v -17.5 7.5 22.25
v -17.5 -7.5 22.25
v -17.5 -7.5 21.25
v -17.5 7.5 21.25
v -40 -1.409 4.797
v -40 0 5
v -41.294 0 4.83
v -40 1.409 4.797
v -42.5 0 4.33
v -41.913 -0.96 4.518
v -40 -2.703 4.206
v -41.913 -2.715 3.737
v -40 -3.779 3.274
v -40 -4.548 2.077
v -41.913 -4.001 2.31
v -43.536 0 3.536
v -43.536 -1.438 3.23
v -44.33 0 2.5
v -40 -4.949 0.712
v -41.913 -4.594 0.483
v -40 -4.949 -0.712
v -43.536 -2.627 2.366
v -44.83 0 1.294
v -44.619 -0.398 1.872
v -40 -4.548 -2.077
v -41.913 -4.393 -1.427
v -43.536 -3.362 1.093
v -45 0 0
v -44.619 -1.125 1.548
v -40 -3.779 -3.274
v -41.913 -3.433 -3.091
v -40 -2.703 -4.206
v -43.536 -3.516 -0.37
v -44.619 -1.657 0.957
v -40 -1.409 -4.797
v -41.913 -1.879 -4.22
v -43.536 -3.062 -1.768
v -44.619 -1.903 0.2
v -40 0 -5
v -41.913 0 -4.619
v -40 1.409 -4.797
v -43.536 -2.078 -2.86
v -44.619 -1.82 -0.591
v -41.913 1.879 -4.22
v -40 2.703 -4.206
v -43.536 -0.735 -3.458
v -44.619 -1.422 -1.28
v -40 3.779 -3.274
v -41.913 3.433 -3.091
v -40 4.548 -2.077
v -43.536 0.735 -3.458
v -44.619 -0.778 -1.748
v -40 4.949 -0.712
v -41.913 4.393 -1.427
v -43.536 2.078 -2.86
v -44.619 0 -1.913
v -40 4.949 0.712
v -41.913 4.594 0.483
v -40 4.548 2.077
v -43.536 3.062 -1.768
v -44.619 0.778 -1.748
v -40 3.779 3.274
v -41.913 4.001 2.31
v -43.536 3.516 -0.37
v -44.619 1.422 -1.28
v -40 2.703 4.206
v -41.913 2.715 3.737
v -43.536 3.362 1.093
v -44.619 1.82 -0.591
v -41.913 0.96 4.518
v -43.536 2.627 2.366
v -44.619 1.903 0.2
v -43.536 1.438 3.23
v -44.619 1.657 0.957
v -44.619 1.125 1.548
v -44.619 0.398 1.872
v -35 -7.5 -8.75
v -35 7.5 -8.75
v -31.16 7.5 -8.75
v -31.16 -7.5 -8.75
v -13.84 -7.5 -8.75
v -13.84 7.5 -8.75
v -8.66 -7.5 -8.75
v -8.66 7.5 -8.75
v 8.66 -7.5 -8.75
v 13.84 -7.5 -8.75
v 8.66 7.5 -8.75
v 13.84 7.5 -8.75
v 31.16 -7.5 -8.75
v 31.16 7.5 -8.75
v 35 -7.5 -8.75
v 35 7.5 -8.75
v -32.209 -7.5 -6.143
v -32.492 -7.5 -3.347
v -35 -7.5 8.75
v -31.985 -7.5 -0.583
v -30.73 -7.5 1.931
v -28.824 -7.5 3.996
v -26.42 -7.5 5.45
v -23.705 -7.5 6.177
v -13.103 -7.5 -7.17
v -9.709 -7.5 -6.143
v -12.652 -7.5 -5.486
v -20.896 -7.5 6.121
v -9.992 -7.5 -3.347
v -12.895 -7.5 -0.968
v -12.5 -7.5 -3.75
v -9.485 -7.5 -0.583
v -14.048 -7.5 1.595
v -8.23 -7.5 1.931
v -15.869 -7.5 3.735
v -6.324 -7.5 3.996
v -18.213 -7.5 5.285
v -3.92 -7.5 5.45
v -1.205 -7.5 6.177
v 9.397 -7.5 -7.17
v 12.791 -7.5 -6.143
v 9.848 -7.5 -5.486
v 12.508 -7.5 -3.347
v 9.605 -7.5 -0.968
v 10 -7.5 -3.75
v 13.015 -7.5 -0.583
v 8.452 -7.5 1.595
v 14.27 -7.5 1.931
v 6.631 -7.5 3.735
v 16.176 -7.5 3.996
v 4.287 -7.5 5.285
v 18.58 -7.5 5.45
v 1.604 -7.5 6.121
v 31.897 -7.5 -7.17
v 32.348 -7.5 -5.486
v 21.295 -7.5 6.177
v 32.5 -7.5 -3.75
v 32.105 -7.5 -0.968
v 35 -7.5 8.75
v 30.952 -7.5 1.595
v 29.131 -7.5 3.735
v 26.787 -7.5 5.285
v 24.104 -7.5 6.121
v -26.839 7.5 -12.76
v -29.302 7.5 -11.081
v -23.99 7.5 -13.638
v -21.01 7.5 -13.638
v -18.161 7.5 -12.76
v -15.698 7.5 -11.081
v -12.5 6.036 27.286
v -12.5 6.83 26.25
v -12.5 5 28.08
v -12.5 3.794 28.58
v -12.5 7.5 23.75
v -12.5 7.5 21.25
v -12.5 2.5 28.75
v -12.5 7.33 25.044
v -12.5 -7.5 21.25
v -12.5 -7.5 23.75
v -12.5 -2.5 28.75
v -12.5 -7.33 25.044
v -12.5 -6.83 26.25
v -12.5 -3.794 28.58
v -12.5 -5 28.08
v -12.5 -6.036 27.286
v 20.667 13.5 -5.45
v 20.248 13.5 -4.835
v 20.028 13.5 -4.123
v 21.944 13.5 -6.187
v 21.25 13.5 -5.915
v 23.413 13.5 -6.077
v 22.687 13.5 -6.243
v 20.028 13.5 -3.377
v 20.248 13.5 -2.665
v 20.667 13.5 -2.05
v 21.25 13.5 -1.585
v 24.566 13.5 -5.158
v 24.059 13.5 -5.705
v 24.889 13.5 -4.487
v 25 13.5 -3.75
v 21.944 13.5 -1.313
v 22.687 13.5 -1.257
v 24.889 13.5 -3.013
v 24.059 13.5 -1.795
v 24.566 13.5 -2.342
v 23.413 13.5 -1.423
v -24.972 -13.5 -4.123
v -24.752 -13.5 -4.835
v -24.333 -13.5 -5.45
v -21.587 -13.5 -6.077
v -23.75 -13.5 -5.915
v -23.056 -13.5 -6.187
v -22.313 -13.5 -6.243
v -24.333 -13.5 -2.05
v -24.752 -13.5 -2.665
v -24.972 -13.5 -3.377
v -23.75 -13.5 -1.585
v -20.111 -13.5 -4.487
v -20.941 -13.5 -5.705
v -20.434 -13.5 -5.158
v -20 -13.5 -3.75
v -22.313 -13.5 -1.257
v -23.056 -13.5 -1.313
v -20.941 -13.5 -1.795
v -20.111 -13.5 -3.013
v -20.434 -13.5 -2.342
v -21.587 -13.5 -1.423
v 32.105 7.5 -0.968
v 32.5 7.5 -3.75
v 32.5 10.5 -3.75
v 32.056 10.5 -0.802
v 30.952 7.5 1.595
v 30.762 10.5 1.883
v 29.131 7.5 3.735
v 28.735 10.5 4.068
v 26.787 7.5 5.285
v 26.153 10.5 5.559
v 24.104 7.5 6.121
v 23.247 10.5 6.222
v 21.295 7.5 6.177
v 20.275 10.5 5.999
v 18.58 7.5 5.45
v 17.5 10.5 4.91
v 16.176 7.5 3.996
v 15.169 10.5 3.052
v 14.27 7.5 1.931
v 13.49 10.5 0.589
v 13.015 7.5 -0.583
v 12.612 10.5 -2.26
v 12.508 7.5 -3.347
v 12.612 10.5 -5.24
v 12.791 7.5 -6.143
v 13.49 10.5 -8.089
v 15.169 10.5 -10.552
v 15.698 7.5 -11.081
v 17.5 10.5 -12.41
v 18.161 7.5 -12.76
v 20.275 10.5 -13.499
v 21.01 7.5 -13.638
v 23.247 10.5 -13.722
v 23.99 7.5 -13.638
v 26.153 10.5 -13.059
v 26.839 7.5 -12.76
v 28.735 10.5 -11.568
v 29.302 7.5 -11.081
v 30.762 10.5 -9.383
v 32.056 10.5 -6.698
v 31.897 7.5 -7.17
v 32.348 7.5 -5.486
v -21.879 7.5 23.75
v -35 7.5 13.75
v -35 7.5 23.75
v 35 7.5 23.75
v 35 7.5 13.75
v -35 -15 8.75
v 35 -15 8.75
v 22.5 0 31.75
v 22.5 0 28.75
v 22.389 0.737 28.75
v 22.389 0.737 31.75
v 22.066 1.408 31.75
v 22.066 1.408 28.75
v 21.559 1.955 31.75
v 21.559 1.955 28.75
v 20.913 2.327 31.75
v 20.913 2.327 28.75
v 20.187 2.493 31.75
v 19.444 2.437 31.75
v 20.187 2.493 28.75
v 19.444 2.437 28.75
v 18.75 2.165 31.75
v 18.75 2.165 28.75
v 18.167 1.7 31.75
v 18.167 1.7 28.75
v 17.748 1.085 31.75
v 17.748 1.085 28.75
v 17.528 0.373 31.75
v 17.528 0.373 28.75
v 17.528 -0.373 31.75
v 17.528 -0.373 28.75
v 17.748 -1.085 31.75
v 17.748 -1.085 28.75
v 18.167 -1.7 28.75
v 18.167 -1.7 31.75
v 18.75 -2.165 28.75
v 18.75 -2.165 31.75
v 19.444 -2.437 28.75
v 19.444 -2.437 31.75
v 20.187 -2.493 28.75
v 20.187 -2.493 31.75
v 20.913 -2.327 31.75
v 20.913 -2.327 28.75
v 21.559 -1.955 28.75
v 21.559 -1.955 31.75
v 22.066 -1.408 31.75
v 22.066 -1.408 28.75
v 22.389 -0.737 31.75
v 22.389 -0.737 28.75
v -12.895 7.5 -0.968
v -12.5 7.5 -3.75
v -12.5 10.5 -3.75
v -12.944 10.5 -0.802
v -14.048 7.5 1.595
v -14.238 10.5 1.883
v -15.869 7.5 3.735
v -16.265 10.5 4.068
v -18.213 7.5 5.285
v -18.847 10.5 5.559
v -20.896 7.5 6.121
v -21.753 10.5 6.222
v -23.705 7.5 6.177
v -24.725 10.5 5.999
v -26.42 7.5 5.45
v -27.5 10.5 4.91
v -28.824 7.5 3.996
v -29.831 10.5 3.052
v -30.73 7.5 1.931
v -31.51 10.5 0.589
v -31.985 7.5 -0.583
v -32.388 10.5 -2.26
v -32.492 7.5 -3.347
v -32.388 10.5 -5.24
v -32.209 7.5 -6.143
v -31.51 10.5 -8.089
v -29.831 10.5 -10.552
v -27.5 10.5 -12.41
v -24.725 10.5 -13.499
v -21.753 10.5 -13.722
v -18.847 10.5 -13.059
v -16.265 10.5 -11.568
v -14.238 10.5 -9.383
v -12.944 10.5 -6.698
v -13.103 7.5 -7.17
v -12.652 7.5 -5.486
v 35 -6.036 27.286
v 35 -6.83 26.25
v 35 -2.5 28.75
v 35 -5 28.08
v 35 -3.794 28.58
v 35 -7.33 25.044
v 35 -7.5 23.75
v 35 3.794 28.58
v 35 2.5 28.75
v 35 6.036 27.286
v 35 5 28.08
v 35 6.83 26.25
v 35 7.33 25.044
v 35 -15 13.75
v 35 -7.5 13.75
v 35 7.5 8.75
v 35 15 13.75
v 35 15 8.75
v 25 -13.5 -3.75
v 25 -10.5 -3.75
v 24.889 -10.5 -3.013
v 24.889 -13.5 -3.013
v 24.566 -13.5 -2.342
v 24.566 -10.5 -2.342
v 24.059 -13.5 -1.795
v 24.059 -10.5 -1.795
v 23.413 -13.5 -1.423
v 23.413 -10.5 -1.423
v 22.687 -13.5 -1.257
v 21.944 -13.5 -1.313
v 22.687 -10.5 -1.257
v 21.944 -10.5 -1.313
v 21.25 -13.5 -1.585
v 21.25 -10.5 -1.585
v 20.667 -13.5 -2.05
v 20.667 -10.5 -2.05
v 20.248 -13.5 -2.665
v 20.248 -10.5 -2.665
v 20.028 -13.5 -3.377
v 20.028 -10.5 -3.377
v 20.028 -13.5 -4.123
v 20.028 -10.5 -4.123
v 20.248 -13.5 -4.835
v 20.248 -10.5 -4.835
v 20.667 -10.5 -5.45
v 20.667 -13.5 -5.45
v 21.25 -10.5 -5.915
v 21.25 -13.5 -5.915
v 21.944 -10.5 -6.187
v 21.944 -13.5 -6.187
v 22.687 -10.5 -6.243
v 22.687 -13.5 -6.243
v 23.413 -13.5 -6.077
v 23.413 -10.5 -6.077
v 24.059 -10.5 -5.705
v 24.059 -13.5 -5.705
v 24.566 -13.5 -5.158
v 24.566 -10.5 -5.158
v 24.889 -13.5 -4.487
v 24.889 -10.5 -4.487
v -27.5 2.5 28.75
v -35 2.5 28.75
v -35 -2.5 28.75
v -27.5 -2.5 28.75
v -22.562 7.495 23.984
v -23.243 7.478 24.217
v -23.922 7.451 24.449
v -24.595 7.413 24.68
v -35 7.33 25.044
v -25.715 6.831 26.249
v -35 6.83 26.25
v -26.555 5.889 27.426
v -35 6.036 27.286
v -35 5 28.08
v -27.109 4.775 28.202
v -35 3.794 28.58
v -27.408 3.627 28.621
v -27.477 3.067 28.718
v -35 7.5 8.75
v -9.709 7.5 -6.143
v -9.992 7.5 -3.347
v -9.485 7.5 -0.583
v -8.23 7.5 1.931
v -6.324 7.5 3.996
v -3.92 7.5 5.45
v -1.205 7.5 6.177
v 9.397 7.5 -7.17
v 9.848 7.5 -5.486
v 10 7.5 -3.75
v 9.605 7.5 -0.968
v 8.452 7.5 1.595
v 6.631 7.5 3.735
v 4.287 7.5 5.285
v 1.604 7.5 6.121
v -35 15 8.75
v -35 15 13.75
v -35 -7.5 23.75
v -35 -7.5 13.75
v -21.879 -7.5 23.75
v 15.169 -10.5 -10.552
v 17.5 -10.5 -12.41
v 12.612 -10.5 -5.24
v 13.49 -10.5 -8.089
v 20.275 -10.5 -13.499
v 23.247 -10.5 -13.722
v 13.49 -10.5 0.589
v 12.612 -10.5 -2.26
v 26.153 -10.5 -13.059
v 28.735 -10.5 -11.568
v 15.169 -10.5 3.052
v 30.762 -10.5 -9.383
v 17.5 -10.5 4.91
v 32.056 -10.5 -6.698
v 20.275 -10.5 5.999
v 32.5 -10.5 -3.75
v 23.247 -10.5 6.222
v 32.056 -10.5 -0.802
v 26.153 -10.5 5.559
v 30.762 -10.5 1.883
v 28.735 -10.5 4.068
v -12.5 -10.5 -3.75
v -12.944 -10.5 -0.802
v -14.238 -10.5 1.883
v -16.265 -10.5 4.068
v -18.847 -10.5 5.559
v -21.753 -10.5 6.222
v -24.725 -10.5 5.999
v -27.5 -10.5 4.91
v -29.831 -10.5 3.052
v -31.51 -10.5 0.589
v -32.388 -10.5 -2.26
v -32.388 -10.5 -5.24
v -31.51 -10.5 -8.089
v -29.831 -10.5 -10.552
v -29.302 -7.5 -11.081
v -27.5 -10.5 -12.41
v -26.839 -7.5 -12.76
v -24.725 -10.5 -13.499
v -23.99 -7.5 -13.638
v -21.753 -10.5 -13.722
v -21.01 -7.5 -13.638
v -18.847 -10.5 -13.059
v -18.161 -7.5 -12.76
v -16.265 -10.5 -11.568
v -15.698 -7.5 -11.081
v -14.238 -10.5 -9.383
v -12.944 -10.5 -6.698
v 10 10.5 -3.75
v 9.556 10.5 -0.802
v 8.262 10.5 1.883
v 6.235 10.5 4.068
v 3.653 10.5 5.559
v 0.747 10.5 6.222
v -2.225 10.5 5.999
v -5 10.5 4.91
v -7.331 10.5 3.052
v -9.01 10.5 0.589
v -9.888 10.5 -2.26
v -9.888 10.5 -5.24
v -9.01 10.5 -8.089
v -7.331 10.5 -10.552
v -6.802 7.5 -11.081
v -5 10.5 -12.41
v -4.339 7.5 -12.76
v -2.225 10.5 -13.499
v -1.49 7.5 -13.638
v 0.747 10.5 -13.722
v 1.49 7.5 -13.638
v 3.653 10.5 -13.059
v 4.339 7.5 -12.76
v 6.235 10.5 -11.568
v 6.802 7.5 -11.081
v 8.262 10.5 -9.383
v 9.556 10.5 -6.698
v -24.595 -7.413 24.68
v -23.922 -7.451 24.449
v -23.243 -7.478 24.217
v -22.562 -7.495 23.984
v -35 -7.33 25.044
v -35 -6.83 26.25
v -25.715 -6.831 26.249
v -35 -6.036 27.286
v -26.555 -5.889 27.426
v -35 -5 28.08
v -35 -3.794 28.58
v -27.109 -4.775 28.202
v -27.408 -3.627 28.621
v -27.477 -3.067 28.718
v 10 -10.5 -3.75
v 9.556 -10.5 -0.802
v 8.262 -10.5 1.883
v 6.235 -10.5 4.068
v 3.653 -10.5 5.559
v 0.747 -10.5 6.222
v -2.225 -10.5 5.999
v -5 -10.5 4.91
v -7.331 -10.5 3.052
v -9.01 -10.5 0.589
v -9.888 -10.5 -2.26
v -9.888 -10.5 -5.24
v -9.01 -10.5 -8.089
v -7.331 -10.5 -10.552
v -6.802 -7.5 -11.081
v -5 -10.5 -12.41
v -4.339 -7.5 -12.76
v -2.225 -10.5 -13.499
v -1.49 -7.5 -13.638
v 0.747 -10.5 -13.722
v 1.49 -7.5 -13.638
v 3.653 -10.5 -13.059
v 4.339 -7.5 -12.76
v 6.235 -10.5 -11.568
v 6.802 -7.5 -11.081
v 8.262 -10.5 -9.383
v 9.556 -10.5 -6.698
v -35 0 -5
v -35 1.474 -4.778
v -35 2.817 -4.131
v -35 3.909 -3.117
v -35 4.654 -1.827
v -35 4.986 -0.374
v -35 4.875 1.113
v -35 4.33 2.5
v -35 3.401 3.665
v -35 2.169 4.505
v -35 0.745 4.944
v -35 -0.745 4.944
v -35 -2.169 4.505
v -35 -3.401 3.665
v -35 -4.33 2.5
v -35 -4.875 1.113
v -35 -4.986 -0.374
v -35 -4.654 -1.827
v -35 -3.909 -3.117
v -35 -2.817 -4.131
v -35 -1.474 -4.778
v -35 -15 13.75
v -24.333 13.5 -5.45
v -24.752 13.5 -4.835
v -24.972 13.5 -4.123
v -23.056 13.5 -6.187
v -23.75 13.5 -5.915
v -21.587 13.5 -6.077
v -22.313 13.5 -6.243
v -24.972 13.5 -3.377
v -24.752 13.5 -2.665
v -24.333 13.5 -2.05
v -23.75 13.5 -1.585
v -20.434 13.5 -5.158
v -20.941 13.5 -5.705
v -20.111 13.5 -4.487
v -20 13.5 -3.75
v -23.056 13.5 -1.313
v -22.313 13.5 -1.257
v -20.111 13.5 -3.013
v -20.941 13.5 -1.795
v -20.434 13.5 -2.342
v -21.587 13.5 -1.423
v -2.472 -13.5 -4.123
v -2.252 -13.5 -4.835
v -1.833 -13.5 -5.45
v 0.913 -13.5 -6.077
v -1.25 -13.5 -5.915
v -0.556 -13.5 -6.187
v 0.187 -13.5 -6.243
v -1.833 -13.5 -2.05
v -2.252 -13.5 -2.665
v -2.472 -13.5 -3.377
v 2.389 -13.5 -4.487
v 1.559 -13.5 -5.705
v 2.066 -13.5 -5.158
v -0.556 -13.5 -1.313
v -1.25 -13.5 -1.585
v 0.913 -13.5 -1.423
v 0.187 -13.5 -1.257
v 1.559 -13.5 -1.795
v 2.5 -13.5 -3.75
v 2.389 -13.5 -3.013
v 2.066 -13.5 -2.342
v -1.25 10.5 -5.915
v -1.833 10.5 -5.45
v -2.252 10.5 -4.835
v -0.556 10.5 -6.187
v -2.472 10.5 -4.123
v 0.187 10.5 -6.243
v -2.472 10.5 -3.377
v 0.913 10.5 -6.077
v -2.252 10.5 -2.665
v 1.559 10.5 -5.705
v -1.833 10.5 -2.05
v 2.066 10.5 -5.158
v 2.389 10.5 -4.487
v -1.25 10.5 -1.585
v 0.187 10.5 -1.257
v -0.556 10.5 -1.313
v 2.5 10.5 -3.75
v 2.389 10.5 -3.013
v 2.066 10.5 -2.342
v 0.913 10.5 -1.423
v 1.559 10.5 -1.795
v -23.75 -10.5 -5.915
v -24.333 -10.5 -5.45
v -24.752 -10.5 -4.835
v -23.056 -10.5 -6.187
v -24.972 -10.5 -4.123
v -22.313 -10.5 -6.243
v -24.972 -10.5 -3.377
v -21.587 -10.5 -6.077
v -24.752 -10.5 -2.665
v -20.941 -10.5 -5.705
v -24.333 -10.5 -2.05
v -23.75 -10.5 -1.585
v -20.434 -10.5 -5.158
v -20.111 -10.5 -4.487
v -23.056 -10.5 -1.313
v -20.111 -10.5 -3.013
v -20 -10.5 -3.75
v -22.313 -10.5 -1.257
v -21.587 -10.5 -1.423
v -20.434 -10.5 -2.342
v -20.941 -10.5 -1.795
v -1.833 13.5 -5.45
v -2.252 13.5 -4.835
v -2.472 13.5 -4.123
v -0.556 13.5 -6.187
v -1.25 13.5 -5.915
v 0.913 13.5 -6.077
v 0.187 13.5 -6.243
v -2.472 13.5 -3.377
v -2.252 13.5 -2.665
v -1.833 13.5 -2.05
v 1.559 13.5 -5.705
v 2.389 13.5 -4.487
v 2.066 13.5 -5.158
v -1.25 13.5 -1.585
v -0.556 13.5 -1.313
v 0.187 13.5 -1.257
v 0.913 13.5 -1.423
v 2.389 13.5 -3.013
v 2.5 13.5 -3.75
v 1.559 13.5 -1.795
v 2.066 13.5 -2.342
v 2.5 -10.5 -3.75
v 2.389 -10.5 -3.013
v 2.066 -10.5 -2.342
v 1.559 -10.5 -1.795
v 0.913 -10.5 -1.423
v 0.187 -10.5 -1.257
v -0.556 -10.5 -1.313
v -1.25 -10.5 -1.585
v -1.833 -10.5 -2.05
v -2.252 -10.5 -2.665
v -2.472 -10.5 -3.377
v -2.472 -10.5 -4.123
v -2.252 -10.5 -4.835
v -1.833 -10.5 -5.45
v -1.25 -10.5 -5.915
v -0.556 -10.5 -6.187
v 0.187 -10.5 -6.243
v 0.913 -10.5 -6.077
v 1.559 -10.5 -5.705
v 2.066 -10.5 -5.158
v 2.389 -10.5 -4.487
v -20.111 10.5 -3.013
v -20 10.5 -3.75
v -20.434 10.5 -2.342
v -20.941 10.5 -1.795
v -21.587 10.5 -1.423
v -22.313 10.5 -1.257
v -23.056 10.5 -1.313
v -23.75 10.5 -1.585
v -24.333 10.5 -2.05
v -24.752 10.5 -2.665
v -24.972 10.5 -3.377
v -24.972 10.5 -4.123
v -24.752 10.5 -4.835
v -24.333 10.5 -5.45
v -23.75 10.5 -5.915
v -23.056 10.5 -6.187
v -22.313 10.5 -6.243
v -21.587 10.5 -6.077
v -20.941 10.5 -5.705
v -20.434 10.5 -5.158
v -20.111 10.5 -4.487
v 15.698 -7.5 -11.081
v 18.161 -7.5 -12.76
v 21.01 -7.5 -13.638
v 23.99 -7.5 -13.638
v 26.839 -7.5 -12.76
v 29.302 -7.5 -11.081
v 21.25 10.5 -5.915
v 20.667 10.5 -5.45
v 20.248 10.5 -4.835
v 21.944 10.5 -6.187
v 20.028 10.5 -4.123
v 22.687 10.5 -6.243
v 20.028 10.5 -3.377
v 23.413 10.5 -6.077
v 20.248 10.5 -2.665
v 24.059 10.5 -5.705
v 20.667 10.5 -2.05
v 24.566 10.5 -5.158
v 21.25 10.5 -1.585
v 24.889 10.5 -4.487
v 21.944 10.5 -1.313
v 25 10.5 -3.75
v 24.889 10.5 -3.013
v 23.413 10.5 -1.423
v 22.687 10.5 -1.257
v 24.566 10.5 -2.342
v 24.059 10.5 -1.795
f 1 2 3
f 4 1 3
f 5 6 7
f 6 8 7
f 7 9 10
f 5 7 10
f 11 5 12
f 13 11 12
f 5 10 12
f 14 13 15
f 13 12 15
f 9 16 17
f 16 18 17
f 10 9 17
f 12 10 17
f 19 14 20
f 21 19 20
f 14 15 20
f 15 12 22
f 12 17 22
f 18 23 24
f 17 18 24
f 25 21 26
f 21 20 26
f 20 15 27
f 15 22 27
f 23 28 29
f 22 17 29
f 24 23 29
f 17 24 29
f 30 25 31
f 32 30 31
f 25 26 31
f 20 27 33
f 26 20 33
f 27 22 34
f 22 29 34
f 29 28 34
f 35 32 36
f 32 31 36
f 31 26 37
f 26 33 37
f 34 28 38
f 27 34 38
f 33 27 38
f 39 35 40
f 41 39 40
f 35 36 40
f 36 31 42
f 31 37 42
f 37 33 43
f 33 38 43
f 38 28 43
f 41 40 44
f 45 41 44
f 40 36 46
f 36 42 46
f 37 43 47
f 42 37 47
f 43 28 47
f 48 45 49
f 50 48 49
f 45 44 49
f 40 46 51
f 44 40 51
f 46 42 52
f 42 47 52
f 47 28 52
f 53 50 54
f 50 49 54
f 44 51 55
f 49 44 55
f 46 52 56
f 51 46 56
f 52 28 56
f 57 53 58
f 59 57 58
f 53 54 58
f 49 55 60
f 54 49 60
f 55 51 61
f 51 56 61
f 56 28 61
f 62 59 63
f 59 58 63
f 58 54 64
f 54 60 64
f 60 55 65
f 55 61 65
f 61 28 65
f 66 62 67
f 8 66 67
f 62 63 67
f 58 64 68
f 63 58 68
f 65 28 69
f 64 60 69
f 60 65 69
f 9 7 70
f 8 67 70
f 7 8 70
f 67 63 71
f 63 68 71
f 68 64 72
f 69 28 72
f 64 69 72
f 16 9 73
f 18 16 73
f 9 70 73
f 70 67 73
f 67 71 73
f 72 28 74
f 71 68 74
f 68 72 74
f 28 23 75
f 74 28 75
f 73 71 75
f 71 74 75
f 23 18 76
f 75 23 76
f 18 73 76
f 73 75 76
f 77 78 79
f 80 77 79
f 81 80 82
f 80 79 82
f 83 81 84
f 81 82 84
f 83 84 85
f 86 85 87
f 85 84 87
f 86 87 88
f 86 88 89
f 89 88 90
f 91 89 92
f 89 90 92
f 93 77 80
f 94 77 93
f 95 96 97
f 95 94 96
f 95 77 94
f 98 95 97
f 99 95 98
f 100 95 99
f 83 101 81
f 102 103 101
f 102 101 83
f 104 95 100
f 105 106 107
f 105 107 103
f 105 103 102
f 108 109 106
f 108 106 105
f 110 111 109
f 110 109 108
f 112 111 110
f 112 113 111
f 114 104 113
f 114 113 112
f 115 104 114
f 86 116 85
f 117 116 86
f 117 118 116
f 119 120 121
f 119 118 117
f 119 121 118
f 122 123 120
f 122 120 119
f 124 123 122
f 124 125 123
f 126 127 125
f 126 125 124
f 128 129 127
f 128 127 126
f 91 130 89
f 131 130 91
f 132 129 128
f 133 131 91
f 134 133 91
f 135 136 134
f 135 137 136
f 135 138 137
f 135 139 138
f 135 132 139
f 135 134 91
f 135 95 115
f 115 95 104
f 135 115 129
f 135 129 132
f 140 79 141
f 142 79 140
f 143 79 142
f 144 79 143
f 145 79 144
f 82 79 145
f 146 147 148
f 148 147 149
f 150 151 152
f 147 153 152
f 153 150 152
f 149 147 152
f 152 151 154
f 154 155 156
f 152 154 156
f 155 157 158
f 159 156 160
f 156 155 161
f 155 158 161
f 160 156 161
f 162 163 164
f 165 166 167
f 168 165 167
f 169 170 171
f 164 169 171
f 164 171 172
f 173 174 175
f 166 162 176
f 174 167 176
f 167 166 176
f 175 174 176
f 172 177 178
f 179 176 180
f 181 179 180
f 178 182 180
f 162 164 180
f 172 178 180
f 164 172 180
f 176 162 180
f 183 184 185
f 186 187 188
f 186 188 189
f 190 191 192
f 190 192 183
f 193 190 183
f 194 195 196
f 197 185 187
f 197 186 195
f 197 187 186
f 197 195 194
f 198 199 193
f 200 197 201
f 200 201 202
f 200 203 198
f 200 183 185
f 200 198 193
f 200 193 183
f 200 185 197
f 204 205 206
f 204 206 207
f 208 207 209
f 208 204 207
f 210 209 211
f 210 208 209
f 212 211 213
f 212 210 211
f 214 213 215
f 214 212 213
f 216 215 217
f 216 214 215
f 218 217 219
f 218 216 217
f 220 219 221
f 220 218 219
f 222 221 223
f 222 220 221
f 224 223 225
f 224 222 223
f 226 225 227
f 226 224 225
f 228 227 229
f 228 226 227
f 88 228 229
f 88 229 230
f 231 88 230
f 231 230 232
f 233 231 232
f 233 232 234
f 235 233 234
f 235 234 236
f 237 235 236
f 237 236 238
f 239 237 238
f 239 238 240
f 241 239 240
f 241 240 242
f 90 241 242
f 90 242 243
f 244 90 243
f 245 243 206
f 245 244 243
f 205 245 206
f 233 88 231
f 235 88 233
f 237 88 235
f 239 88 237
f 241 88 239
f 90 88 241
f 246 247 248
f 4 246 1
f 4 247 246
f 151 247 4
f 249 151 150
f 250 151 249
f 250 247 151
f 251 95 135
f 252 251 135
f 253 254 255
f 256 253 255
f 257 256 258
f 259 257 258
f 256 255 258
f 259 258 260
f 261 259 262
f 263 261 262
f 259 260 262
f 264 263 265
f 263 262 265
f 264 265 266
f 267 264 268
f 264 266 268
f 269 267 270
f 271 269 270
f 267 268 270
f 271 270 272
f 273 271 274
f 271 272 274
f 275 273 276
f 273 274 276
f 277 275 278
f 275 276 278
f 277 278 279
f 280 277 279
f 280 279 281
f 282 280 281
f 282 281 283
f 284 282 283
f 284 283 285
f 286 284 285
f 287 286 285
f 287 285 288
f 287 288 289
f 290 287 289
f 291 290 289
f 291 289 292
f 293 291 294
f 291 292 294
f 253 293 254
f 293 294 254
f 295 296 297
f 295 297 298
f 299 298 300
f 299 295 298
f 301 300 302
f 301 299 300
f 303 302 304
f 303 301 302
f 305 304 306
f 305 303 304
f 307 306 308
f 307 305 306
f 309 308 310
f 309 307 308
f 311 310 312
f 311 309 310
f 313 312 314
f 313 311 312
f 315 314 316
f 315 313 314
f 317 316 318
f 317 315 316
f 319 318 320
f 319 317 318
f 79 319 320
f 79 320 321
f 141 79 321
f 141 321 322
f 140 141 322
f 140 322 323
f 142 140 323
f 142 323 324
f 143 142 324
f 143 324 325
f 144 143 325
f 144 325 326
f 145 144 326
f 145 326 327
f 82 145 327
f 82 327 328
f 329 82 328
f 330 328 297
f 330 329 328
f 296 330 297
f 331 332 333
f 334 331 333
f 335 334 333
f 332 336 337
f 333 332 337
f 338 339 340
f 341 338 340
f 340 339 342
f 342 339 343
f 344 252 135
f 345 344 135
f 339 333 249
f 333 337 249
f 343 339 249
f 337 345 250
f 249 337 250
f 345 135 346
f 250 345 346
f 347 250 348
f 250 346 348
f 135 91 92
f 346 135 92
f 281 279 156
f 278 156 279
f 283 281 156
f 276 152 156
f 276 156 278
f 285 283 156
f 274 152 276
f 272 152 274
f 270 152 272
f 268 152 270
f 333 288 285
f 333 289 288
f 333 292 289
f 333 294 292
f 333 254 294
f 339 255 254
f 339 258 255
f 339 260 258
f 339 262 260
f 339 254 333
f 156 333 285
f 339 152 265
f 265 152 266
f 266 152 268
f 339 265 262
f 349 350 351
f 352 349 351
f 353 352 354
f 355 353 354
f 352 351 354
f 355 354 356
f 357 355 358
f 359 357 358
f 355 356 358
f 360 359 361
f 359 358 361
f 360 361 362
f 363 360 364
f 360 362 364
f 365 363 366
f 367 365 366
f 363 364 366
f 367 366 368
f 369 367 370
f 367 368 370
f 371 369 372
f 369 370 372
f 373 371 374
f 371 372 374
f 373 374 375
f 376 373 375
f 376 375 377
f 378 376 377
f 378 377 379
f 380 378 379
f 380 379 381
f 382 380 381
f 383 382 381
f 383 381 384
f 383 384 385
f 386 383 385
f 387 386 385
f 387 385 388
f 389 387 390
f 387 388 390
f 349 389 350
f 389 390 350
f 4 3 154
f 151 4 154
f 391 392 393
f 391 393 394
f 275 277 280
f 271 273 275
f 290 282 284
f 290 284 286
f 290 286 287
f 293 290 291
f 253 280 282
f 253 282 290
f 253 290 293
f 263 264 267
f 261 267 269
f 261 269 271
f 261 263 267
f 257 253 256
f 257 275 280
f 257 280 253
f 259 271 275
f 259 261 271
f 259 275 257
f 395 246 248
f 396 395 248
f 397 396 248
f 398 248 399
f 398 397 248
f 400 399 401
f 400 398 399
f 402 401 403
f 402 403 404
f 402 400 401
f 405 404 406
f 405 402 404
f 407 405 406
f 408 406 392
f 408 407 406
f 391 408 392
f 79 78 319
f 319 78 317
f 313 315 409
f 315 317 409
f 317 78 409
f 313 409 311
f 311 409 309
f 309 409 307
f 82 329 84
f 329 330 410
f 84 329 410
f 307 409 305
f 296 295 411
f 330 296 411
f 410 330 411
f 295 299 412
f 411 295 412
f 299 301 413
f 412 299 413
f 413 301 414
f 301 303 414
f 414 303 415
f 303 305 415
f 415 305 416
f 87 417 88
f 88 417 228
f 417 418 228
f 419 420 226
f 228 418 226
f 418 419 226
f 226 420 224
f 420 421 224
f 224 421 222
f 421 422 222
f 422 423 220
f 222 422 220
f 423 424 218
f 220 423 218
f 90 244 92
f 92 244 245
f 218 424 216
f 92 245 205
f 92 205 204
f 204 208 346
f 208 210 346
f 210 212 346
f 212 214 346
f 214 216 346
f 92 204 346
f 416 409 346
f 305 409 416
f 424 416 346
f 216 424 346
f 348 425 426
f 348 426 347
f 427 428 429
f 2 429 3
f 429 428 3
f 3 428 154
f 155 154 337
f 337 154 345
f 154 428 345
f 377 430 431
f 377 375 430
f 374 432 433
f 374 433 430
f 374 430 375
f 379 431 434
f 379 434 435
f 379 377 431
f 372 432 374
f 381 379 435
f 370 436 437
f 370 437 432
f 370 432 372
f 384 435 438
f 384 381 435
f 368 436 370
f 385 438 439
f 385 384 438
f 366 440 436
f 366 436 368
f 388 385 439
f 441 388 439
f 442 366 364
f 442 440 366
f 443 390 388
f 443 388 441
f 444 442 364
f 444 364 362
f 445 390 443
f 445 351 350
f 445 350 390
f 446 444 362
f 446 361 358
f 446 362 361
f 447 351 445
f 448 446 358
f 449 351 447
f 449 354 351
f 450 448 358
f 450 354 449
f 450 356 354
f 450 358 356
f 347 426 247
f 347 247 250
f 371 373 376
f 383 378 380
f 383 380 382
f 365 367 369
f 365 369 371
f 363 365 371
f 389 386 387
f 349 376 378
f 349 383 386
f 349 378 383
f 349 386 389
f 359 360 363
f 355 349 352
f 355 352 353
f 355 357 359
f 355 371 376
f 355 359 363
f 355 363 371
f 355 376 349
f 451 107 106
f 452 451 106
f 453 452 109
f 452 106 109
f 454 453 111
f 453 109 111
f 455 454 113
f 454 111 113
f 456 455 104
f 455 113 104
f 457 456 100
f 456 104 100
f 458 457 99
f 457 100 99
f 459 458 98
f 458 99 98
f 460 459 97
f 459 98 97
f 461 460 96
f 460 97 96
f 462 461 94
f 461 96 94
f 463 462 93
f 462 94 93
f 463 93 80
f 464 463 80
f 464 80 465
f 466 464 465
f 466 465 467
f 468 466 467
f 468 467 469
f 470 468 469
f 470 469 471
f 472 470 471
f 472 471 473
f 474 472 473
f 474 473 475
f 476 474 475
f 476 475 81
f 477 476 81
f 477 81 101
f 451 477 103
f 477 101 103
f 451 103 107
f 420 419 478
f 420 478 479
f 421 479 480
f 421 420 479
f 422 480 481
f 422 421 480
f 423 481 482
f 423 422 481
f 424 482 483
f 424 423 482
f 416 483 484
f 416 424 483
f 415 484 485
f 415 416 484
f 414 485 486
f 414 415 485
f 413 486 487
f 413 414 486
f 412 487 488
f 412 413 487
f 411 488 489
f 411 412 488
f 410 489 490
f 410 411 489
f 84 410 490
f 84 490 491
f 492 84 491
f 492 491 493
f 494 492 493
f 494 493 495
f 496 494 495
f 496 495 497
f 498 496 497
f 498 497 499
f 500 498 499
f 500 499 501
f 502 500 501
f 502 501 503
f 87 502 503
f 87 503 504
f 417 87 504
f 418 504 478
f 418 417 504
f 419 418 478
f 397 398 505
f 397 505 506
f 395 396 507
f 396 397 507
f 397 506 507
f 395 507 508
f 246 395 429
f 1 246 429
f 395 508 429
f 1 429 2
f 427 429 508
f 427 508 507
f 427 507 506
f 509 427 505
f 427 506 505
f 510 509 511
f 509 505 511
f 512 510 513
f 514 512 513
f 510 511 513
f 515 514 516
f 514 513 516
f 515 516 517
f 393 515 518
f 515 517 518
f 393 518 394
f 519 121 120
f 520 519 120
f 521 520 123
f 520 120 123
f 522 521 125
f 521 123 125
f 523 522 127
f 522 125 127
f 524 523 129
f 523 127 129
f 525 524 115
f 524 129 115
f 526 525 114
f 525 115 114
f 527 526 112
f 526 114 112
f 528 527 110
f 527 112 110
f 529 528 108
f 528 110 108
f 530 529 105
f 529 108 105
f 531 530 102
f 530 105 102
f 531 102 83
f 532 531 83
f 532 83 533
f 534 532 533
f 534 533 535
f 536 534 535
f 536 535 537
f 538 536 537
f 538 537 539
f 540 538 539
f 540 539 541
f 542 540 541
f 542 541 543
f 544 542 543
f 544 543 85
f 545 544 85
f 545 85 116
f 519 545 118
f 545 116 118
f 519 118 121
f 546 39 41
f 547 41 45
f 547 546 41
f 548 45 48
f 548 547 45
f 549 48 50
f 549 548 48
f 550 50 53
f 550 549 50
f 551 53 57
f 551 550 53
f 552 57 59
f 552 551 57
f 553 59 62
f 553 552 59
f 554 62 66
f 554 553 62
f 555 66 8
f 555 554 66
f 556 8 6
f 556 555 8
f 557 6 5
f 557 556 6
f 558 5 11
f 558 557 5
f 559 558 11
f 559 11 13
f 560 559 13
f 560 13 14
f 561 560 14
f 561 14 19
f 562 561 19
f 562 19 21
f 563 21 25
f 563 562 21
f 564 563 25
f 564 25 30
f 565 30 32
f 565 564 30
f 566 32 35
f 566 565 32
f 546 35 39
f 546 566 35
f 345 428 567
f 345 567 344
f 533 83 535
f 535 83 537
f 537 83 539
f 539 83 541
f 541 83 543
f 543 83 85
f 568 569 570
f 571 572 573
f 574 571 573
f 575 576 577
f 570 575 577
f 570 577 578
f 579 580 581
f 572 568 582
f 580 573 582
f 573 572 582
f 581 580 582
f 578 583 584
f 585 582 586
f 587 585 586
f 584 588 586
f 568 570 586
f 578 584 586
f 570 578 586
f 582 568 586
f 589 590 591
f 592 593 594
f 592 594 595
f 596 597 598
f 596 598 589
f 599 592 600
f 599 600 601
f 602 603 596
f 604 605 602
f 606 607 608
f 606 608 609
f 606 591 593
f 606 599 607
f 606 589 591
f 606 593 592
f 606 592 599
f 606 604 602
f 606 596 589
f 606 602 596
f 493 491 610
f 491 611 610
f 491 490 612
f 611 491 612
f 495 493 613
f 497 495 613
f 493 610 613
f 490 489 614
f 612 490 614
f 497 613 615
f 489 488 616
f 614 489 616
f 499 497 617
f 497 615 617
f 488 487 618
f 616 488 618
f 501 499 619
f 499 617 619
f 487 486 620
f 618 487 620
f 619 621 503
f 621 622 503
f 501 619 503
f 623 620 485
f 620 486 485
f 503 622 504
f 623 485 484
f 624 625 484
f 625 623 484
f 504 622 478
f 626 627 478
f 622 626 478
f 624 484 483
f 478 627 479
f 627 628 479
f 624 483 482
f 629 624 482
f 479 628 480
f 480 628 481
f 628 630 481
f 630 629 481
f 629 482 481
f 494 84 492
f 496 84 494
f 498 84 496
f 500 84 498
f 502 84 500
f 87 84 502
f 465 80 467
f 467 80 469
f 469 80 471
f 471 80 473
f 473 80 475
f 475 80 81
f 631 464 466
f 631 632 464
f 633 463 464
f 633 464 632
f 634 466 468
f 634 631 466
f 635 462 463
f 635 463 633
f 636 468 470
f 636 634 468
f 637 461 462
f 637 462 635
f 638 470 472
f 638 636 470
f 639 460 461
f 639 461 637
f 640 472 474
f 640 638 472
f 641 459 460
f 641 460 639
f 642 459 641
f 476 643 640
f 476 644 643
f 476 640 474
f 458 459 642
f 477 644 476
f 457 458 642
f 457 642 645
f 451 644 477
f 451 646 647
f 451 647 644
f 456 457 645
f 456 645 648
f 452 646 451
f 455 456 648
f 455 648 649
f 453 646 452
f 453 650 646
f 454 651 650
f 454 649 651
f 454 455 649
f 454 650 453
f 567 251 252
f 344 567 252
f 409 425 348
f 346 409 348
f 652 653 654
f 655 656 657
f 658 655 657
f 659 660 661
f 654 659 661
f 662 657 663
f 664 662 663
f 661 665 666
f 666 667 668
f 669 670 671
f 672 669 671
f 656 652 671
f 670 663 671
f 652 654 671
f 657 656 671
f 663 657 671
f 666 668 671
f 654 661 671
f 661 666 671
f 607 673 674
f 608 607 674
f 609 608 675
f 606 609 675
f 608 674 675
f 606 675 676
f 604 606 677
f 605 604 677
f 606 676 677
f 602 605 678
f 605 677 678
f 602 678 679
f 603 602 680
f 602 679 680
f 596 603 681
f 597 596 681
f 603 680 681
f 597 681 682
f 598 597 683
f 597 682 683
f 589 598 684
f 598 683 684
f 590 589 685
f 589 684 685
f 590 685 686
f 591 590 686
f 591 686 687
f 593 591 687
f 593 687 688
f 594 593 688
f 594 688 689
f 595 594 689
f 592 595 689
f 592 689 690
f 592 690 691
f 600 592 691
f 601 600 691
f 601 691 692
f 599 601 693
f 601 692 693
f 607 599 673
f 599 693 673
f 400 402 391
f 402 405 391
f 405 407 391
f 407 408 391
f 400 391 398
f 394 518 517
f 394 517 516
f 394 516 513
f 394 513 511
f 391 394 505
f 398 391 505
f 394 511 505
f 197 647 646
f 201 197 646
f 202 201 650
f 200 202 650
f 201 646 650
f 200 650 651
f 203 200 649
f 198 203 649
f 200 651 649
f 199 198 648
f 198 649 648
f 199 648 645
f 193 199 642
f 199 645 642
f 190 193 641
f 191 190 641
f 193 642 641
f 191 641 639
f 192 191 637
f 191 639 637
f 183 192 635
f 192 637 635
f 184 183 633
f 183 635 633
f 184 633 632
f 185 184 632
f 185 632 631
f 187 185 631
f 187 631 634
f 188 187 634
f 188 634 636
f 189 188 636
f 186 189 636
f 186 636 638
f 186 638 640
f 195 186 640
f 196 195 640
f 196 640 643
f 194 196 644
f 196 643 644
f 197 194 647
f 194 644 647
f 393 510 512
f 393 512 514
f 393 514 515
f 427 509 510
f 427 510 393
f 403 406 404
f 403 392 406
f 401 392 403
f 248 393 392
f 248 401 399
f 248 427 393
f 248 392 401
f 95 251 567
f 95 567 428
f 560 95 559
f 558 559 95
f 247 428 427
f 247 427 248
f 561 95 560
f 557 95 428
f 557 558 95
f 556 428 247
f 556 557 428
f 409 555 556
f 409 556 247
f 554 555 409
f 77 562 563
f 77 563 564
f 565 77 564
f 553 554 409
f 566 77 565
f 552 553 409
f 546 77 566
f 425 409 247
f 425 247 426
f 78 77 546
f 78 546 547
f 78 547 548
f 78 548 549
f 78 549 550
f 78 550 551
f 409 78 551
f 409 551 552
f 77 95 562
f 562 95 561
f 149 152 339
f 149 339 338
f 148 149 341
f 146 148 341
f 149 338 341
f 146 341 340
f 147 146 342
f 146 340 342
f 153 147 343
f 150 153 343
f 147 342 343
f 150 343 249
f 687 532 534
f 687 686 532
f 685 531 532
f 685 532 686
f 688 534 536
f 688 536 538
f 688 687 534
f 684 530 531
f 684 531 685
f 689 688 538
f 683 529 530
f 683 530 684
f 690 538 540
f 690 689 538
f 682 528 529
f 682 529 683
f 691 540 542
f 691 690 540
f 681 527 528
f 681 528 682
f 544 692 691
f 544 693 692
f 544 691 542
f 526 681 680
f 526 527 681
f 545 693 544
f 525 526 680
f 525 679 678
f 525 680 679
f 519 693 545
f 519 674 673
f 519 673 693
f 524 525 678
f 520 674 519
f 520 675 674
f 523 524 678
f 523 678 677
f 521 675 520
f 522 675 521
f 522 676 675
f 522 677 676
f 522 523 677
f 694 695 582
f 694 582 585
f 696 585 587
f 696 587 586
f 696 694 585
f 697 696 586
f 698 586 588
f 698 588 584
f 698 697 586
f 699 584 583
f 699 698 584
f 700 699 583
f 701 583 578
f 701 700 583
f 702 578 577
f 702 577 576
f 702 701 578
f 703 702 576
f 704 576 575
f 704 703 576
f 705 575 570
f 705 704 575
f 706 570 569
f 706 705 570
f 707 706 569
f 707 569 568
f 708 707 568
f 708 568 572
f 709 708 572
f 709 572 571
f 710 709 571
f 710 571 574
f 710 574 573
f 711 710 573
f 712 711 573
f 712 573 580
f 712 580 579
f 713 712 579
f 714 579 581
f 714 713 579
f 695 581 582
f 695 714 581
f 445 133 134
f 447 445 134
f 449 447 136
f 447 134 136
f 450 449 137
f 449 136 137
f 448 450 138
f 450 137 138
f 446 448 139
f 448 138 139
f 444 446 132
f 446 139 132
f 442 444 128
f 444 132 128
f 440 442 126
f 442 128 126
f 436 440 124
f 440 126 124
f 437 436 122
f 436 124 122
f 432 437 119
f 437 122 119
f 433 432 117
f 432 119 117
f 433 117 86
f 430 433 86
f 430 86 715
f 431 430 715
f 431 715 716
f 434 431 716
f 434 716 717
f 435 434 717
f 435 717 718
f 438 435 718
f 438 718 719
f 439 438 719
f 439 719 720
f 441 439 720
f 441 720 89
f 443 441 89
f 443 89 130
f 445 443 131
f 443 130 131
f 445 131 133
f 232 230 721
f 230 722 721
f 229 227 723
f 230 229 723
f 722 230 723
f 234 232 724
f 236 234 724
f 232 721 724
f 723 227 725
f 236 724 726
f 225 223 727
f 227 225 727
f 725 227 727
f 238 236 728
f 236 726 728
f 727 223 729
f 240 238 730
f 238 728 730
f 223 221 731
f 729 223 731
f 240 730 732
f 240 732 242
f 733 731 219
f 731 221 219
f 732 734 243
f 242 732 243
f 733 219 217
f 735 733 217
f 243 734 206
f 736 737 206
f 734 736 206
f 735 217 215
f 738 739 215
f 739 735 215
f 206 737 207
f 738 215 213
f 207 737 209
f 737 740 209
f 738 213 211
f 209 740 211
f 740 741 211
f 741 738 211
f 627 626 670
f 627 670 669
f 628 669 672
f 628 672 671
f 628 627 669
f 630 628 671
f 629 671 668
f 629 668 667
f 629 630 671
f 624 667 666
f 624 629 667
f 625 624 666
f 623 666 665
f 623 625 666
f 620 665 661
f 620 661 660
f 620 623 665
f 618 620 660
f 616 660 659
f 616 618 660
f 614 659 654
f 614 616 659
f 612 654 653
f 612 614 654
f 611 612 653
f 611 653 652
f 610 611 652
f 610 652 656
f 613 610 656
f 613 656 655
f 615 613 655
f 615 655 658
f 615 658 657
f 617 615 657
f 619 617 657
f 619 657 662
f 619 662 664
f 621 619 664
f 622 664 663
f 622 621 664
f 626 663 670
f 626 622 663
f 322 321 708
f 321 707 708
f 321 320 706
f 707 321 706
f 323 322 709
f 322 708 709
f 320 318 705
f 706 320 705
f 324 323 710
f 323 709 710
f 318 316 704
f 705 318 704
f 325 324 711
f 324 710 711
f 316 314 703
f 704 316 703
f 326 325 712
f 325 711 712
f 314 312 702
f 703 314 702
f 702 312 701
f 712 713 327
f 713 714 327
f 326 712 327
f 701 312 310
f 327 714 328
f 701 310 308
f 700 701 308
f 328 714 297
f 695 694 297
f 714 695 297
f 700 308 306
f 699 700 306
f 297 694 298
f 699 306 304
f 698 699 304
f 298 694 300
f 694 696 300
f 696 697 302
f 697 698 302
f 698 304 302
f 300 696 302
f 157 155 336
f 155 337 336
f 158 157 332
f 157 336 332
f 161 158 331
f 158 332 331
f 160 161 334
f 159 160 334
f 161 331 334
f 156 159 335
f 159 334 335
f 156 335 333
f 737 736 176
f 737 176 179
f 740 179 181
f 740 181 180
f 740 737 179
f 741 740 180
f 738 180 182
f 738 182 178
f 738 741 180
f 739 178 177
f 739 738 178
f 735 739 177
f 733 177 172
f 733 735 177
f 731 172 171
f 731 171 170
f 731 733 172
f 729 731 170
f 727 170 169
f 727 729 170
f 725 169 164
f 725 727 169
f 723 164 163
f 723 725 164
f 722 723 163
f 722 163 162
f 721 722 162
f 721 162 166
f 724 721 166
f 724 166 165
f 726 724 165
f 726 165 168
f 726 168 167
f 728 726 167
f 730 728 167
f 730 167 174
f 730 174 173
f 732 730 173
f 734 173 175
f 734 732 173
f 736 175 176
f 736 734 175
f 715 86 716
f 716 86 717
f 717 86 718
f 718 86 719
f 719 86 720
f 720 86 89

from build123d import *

# Parameters (mm, degrees)
F0_W      = 70
F0_H      = 15
F1_DEPTH  = 8.75
F2_W      = 70
F2_H      = 30
F3_DEPTH  = 5
F4_W      = 70
F4_H      = 15
F5_DEPTH  = 15
F6_W      = 5
F6_H      = 5
F8_R      = 10
F9_DEPTH  = 3
F10_R     = 10
F11_DEPTH = 3
F12_R     = 10
F13_DEPTH = 3
F14_R     = 2.5
F15_DEPTH = 3
F16_R     = 2.5
F17_DEPTH = 3
F18_R     = 2.5
F19_DEPTH = 3
F20_R     = 2.5
F21_DEPTH = 3
F23_DEPTH = 15
F24_R     = 5
F25_R     = 5


# Not quite as in the source:
# - a pattern or mirror of a feature is missing from the dataset's text; its kind, count and spacing are read off the source's solid


with BuildPart() as f1:
    # F0 (on Top) → F1 (new body, symmetric)
    with BuildSketch(Plane.XY):
        Rectangle(F0_W, F0_H)
    extrude(amount=F1_DEPTH, both=True)

    # F2 (on face) → F3 (join)
    with BuildSketch(Plane.XY.offset(8.75)):
        Rectangle(F2_W, F2_H)
    extrude(amount=F3_DEPTH)

    # F4 (on face) → F5 (join)
    with BuildSketch(Plane.XY.offset(13.75)):
        Rectangle(F4_W, F4_H)
    extrude(amount=F5_DEPTH)

    # F6 (on Front) → F7 (revolve)
    with BuildSketch(Plane.XZ):
        with Locations((-37.5, -2.5)):
            Rectangle(F6_W, F6_H)
    revolve(axis=Axis((0.3605282434, 0, 0), (1, 0, 0)))

    # F8 (on face) → F9 (join)
    with BuildSketch(Plane.XZ.offset(7.5)):
        with Locations((-22.5, -3.75)):
            Circle(F8_R)
    f9 = extrude(amount=F9_DEPTH)

    # F9_copies: F9 across plane
    add(f9.mirror(Plane.ZX))

    # F10 (on face) → F11 (join)
    with BuildSketch(Plane.XZ.offset(7.5)):
        with Locations((0, -3.75)):
            Circle(F10_R)
    f11 = extrude(amount=F11_DEPTH)

    # F11_copies: F11 across plane
    add(f11.mirror(Plane.ZX))

    # F12 (on face) → F13 (join)
    with BuildSketch(Plane.XZ.offset(7.5)):
        with Locations((22.5, -3.75)):
            Circle(F12_R)
    f13 = extrude(amount=F13_DEPTH)

    # F13_copies: F13 across plane
    add(f13.mirror(Plane.ZX))

    # F14 (on face) → F15 (join)
    with BuildSketch(Plane.XZ.offset(10.5)):
        with Locations((-22.5, -3.75)):
            Circle(F14_R)
    f15 = extrude(amount=F15_DEPTH)

    # F15_copies: F15 across plane
    add(f15.mirror(Plane.ZX))

    # F16 (on face) → F17 (join)
    with BuildSketch(Plane.XZ.offset(10.5)):
        with Locations((0, -3.75)):
            Circle(F16_R)
    f17 = extrude(amount=F17_DEPTH)

    # F17_copies: F17 across plane
    add(f17.mirror(Plane.ZX))

    # F18 (on face) → F19 (join)
    with BuildSketch(Plane.XZ.offset(10.5)):
        with Locations((22.5, -3.75)):
            Circle(F18_R)
    f19 = extrude(amount=F19_DEPTH)

    # F19_copies: F19 across plane
    add(f19.mirror(Plane.ZX))

    # F20 (on face) → F21 (join)
    with BuildSketch(Plane.XY.offset(28.75)):
        with Locations((20, 0)):
            Circle(F20_R)
    extrude(amount=F21_DEPTH)

    # F22 (on face) → F23 (cut, through all)
    with BuildSketch(Plane.XZ.offset(7.5)):
        Polygon((-12.5, 28.75), (-27.5, 28.75), (-24.5953480316, 24.6802337976), (-17.5, 22.25), (-17.5, 21.25), (-12.5, 21.25), align=None)
    extrude(amount=-F23_DEPTH, mode=Mode.SUBTRACT)

    # F24
    f24_edges = [f1.edges().sort_by_distance(p)[0] for p in [
        (11.25, -7.5, 28.75),
        (11.25, 7.5, 28.75),
    ]]
    fillet(f24_edges, radius=F24_R)

    # F25
    f25_edges = [f1.edges().sort_by_distance(p)[0] for p in [
        (-31.25, -7.5, 28.75),
        (-31.25, 7.5, 28.75),
    ]]
    fillet(f25_edges, radius=F25_R)

    # F26 (on Front) → F27 (revolve)
    with BuildSketch(Plane.XZ):
        with BuildLine():
            Line((-40, 0), (-40, 5))
            ThreePointArc((-40, 5), (-43.5355339059, 3.5355339059), (-45, 0))
            Line((-45, 0), (-40, 0))
        make_face()
    revolve(axis=Axis((-36.5614034235, 0, 0), (1, 0, 0)))


solid = f1.part
